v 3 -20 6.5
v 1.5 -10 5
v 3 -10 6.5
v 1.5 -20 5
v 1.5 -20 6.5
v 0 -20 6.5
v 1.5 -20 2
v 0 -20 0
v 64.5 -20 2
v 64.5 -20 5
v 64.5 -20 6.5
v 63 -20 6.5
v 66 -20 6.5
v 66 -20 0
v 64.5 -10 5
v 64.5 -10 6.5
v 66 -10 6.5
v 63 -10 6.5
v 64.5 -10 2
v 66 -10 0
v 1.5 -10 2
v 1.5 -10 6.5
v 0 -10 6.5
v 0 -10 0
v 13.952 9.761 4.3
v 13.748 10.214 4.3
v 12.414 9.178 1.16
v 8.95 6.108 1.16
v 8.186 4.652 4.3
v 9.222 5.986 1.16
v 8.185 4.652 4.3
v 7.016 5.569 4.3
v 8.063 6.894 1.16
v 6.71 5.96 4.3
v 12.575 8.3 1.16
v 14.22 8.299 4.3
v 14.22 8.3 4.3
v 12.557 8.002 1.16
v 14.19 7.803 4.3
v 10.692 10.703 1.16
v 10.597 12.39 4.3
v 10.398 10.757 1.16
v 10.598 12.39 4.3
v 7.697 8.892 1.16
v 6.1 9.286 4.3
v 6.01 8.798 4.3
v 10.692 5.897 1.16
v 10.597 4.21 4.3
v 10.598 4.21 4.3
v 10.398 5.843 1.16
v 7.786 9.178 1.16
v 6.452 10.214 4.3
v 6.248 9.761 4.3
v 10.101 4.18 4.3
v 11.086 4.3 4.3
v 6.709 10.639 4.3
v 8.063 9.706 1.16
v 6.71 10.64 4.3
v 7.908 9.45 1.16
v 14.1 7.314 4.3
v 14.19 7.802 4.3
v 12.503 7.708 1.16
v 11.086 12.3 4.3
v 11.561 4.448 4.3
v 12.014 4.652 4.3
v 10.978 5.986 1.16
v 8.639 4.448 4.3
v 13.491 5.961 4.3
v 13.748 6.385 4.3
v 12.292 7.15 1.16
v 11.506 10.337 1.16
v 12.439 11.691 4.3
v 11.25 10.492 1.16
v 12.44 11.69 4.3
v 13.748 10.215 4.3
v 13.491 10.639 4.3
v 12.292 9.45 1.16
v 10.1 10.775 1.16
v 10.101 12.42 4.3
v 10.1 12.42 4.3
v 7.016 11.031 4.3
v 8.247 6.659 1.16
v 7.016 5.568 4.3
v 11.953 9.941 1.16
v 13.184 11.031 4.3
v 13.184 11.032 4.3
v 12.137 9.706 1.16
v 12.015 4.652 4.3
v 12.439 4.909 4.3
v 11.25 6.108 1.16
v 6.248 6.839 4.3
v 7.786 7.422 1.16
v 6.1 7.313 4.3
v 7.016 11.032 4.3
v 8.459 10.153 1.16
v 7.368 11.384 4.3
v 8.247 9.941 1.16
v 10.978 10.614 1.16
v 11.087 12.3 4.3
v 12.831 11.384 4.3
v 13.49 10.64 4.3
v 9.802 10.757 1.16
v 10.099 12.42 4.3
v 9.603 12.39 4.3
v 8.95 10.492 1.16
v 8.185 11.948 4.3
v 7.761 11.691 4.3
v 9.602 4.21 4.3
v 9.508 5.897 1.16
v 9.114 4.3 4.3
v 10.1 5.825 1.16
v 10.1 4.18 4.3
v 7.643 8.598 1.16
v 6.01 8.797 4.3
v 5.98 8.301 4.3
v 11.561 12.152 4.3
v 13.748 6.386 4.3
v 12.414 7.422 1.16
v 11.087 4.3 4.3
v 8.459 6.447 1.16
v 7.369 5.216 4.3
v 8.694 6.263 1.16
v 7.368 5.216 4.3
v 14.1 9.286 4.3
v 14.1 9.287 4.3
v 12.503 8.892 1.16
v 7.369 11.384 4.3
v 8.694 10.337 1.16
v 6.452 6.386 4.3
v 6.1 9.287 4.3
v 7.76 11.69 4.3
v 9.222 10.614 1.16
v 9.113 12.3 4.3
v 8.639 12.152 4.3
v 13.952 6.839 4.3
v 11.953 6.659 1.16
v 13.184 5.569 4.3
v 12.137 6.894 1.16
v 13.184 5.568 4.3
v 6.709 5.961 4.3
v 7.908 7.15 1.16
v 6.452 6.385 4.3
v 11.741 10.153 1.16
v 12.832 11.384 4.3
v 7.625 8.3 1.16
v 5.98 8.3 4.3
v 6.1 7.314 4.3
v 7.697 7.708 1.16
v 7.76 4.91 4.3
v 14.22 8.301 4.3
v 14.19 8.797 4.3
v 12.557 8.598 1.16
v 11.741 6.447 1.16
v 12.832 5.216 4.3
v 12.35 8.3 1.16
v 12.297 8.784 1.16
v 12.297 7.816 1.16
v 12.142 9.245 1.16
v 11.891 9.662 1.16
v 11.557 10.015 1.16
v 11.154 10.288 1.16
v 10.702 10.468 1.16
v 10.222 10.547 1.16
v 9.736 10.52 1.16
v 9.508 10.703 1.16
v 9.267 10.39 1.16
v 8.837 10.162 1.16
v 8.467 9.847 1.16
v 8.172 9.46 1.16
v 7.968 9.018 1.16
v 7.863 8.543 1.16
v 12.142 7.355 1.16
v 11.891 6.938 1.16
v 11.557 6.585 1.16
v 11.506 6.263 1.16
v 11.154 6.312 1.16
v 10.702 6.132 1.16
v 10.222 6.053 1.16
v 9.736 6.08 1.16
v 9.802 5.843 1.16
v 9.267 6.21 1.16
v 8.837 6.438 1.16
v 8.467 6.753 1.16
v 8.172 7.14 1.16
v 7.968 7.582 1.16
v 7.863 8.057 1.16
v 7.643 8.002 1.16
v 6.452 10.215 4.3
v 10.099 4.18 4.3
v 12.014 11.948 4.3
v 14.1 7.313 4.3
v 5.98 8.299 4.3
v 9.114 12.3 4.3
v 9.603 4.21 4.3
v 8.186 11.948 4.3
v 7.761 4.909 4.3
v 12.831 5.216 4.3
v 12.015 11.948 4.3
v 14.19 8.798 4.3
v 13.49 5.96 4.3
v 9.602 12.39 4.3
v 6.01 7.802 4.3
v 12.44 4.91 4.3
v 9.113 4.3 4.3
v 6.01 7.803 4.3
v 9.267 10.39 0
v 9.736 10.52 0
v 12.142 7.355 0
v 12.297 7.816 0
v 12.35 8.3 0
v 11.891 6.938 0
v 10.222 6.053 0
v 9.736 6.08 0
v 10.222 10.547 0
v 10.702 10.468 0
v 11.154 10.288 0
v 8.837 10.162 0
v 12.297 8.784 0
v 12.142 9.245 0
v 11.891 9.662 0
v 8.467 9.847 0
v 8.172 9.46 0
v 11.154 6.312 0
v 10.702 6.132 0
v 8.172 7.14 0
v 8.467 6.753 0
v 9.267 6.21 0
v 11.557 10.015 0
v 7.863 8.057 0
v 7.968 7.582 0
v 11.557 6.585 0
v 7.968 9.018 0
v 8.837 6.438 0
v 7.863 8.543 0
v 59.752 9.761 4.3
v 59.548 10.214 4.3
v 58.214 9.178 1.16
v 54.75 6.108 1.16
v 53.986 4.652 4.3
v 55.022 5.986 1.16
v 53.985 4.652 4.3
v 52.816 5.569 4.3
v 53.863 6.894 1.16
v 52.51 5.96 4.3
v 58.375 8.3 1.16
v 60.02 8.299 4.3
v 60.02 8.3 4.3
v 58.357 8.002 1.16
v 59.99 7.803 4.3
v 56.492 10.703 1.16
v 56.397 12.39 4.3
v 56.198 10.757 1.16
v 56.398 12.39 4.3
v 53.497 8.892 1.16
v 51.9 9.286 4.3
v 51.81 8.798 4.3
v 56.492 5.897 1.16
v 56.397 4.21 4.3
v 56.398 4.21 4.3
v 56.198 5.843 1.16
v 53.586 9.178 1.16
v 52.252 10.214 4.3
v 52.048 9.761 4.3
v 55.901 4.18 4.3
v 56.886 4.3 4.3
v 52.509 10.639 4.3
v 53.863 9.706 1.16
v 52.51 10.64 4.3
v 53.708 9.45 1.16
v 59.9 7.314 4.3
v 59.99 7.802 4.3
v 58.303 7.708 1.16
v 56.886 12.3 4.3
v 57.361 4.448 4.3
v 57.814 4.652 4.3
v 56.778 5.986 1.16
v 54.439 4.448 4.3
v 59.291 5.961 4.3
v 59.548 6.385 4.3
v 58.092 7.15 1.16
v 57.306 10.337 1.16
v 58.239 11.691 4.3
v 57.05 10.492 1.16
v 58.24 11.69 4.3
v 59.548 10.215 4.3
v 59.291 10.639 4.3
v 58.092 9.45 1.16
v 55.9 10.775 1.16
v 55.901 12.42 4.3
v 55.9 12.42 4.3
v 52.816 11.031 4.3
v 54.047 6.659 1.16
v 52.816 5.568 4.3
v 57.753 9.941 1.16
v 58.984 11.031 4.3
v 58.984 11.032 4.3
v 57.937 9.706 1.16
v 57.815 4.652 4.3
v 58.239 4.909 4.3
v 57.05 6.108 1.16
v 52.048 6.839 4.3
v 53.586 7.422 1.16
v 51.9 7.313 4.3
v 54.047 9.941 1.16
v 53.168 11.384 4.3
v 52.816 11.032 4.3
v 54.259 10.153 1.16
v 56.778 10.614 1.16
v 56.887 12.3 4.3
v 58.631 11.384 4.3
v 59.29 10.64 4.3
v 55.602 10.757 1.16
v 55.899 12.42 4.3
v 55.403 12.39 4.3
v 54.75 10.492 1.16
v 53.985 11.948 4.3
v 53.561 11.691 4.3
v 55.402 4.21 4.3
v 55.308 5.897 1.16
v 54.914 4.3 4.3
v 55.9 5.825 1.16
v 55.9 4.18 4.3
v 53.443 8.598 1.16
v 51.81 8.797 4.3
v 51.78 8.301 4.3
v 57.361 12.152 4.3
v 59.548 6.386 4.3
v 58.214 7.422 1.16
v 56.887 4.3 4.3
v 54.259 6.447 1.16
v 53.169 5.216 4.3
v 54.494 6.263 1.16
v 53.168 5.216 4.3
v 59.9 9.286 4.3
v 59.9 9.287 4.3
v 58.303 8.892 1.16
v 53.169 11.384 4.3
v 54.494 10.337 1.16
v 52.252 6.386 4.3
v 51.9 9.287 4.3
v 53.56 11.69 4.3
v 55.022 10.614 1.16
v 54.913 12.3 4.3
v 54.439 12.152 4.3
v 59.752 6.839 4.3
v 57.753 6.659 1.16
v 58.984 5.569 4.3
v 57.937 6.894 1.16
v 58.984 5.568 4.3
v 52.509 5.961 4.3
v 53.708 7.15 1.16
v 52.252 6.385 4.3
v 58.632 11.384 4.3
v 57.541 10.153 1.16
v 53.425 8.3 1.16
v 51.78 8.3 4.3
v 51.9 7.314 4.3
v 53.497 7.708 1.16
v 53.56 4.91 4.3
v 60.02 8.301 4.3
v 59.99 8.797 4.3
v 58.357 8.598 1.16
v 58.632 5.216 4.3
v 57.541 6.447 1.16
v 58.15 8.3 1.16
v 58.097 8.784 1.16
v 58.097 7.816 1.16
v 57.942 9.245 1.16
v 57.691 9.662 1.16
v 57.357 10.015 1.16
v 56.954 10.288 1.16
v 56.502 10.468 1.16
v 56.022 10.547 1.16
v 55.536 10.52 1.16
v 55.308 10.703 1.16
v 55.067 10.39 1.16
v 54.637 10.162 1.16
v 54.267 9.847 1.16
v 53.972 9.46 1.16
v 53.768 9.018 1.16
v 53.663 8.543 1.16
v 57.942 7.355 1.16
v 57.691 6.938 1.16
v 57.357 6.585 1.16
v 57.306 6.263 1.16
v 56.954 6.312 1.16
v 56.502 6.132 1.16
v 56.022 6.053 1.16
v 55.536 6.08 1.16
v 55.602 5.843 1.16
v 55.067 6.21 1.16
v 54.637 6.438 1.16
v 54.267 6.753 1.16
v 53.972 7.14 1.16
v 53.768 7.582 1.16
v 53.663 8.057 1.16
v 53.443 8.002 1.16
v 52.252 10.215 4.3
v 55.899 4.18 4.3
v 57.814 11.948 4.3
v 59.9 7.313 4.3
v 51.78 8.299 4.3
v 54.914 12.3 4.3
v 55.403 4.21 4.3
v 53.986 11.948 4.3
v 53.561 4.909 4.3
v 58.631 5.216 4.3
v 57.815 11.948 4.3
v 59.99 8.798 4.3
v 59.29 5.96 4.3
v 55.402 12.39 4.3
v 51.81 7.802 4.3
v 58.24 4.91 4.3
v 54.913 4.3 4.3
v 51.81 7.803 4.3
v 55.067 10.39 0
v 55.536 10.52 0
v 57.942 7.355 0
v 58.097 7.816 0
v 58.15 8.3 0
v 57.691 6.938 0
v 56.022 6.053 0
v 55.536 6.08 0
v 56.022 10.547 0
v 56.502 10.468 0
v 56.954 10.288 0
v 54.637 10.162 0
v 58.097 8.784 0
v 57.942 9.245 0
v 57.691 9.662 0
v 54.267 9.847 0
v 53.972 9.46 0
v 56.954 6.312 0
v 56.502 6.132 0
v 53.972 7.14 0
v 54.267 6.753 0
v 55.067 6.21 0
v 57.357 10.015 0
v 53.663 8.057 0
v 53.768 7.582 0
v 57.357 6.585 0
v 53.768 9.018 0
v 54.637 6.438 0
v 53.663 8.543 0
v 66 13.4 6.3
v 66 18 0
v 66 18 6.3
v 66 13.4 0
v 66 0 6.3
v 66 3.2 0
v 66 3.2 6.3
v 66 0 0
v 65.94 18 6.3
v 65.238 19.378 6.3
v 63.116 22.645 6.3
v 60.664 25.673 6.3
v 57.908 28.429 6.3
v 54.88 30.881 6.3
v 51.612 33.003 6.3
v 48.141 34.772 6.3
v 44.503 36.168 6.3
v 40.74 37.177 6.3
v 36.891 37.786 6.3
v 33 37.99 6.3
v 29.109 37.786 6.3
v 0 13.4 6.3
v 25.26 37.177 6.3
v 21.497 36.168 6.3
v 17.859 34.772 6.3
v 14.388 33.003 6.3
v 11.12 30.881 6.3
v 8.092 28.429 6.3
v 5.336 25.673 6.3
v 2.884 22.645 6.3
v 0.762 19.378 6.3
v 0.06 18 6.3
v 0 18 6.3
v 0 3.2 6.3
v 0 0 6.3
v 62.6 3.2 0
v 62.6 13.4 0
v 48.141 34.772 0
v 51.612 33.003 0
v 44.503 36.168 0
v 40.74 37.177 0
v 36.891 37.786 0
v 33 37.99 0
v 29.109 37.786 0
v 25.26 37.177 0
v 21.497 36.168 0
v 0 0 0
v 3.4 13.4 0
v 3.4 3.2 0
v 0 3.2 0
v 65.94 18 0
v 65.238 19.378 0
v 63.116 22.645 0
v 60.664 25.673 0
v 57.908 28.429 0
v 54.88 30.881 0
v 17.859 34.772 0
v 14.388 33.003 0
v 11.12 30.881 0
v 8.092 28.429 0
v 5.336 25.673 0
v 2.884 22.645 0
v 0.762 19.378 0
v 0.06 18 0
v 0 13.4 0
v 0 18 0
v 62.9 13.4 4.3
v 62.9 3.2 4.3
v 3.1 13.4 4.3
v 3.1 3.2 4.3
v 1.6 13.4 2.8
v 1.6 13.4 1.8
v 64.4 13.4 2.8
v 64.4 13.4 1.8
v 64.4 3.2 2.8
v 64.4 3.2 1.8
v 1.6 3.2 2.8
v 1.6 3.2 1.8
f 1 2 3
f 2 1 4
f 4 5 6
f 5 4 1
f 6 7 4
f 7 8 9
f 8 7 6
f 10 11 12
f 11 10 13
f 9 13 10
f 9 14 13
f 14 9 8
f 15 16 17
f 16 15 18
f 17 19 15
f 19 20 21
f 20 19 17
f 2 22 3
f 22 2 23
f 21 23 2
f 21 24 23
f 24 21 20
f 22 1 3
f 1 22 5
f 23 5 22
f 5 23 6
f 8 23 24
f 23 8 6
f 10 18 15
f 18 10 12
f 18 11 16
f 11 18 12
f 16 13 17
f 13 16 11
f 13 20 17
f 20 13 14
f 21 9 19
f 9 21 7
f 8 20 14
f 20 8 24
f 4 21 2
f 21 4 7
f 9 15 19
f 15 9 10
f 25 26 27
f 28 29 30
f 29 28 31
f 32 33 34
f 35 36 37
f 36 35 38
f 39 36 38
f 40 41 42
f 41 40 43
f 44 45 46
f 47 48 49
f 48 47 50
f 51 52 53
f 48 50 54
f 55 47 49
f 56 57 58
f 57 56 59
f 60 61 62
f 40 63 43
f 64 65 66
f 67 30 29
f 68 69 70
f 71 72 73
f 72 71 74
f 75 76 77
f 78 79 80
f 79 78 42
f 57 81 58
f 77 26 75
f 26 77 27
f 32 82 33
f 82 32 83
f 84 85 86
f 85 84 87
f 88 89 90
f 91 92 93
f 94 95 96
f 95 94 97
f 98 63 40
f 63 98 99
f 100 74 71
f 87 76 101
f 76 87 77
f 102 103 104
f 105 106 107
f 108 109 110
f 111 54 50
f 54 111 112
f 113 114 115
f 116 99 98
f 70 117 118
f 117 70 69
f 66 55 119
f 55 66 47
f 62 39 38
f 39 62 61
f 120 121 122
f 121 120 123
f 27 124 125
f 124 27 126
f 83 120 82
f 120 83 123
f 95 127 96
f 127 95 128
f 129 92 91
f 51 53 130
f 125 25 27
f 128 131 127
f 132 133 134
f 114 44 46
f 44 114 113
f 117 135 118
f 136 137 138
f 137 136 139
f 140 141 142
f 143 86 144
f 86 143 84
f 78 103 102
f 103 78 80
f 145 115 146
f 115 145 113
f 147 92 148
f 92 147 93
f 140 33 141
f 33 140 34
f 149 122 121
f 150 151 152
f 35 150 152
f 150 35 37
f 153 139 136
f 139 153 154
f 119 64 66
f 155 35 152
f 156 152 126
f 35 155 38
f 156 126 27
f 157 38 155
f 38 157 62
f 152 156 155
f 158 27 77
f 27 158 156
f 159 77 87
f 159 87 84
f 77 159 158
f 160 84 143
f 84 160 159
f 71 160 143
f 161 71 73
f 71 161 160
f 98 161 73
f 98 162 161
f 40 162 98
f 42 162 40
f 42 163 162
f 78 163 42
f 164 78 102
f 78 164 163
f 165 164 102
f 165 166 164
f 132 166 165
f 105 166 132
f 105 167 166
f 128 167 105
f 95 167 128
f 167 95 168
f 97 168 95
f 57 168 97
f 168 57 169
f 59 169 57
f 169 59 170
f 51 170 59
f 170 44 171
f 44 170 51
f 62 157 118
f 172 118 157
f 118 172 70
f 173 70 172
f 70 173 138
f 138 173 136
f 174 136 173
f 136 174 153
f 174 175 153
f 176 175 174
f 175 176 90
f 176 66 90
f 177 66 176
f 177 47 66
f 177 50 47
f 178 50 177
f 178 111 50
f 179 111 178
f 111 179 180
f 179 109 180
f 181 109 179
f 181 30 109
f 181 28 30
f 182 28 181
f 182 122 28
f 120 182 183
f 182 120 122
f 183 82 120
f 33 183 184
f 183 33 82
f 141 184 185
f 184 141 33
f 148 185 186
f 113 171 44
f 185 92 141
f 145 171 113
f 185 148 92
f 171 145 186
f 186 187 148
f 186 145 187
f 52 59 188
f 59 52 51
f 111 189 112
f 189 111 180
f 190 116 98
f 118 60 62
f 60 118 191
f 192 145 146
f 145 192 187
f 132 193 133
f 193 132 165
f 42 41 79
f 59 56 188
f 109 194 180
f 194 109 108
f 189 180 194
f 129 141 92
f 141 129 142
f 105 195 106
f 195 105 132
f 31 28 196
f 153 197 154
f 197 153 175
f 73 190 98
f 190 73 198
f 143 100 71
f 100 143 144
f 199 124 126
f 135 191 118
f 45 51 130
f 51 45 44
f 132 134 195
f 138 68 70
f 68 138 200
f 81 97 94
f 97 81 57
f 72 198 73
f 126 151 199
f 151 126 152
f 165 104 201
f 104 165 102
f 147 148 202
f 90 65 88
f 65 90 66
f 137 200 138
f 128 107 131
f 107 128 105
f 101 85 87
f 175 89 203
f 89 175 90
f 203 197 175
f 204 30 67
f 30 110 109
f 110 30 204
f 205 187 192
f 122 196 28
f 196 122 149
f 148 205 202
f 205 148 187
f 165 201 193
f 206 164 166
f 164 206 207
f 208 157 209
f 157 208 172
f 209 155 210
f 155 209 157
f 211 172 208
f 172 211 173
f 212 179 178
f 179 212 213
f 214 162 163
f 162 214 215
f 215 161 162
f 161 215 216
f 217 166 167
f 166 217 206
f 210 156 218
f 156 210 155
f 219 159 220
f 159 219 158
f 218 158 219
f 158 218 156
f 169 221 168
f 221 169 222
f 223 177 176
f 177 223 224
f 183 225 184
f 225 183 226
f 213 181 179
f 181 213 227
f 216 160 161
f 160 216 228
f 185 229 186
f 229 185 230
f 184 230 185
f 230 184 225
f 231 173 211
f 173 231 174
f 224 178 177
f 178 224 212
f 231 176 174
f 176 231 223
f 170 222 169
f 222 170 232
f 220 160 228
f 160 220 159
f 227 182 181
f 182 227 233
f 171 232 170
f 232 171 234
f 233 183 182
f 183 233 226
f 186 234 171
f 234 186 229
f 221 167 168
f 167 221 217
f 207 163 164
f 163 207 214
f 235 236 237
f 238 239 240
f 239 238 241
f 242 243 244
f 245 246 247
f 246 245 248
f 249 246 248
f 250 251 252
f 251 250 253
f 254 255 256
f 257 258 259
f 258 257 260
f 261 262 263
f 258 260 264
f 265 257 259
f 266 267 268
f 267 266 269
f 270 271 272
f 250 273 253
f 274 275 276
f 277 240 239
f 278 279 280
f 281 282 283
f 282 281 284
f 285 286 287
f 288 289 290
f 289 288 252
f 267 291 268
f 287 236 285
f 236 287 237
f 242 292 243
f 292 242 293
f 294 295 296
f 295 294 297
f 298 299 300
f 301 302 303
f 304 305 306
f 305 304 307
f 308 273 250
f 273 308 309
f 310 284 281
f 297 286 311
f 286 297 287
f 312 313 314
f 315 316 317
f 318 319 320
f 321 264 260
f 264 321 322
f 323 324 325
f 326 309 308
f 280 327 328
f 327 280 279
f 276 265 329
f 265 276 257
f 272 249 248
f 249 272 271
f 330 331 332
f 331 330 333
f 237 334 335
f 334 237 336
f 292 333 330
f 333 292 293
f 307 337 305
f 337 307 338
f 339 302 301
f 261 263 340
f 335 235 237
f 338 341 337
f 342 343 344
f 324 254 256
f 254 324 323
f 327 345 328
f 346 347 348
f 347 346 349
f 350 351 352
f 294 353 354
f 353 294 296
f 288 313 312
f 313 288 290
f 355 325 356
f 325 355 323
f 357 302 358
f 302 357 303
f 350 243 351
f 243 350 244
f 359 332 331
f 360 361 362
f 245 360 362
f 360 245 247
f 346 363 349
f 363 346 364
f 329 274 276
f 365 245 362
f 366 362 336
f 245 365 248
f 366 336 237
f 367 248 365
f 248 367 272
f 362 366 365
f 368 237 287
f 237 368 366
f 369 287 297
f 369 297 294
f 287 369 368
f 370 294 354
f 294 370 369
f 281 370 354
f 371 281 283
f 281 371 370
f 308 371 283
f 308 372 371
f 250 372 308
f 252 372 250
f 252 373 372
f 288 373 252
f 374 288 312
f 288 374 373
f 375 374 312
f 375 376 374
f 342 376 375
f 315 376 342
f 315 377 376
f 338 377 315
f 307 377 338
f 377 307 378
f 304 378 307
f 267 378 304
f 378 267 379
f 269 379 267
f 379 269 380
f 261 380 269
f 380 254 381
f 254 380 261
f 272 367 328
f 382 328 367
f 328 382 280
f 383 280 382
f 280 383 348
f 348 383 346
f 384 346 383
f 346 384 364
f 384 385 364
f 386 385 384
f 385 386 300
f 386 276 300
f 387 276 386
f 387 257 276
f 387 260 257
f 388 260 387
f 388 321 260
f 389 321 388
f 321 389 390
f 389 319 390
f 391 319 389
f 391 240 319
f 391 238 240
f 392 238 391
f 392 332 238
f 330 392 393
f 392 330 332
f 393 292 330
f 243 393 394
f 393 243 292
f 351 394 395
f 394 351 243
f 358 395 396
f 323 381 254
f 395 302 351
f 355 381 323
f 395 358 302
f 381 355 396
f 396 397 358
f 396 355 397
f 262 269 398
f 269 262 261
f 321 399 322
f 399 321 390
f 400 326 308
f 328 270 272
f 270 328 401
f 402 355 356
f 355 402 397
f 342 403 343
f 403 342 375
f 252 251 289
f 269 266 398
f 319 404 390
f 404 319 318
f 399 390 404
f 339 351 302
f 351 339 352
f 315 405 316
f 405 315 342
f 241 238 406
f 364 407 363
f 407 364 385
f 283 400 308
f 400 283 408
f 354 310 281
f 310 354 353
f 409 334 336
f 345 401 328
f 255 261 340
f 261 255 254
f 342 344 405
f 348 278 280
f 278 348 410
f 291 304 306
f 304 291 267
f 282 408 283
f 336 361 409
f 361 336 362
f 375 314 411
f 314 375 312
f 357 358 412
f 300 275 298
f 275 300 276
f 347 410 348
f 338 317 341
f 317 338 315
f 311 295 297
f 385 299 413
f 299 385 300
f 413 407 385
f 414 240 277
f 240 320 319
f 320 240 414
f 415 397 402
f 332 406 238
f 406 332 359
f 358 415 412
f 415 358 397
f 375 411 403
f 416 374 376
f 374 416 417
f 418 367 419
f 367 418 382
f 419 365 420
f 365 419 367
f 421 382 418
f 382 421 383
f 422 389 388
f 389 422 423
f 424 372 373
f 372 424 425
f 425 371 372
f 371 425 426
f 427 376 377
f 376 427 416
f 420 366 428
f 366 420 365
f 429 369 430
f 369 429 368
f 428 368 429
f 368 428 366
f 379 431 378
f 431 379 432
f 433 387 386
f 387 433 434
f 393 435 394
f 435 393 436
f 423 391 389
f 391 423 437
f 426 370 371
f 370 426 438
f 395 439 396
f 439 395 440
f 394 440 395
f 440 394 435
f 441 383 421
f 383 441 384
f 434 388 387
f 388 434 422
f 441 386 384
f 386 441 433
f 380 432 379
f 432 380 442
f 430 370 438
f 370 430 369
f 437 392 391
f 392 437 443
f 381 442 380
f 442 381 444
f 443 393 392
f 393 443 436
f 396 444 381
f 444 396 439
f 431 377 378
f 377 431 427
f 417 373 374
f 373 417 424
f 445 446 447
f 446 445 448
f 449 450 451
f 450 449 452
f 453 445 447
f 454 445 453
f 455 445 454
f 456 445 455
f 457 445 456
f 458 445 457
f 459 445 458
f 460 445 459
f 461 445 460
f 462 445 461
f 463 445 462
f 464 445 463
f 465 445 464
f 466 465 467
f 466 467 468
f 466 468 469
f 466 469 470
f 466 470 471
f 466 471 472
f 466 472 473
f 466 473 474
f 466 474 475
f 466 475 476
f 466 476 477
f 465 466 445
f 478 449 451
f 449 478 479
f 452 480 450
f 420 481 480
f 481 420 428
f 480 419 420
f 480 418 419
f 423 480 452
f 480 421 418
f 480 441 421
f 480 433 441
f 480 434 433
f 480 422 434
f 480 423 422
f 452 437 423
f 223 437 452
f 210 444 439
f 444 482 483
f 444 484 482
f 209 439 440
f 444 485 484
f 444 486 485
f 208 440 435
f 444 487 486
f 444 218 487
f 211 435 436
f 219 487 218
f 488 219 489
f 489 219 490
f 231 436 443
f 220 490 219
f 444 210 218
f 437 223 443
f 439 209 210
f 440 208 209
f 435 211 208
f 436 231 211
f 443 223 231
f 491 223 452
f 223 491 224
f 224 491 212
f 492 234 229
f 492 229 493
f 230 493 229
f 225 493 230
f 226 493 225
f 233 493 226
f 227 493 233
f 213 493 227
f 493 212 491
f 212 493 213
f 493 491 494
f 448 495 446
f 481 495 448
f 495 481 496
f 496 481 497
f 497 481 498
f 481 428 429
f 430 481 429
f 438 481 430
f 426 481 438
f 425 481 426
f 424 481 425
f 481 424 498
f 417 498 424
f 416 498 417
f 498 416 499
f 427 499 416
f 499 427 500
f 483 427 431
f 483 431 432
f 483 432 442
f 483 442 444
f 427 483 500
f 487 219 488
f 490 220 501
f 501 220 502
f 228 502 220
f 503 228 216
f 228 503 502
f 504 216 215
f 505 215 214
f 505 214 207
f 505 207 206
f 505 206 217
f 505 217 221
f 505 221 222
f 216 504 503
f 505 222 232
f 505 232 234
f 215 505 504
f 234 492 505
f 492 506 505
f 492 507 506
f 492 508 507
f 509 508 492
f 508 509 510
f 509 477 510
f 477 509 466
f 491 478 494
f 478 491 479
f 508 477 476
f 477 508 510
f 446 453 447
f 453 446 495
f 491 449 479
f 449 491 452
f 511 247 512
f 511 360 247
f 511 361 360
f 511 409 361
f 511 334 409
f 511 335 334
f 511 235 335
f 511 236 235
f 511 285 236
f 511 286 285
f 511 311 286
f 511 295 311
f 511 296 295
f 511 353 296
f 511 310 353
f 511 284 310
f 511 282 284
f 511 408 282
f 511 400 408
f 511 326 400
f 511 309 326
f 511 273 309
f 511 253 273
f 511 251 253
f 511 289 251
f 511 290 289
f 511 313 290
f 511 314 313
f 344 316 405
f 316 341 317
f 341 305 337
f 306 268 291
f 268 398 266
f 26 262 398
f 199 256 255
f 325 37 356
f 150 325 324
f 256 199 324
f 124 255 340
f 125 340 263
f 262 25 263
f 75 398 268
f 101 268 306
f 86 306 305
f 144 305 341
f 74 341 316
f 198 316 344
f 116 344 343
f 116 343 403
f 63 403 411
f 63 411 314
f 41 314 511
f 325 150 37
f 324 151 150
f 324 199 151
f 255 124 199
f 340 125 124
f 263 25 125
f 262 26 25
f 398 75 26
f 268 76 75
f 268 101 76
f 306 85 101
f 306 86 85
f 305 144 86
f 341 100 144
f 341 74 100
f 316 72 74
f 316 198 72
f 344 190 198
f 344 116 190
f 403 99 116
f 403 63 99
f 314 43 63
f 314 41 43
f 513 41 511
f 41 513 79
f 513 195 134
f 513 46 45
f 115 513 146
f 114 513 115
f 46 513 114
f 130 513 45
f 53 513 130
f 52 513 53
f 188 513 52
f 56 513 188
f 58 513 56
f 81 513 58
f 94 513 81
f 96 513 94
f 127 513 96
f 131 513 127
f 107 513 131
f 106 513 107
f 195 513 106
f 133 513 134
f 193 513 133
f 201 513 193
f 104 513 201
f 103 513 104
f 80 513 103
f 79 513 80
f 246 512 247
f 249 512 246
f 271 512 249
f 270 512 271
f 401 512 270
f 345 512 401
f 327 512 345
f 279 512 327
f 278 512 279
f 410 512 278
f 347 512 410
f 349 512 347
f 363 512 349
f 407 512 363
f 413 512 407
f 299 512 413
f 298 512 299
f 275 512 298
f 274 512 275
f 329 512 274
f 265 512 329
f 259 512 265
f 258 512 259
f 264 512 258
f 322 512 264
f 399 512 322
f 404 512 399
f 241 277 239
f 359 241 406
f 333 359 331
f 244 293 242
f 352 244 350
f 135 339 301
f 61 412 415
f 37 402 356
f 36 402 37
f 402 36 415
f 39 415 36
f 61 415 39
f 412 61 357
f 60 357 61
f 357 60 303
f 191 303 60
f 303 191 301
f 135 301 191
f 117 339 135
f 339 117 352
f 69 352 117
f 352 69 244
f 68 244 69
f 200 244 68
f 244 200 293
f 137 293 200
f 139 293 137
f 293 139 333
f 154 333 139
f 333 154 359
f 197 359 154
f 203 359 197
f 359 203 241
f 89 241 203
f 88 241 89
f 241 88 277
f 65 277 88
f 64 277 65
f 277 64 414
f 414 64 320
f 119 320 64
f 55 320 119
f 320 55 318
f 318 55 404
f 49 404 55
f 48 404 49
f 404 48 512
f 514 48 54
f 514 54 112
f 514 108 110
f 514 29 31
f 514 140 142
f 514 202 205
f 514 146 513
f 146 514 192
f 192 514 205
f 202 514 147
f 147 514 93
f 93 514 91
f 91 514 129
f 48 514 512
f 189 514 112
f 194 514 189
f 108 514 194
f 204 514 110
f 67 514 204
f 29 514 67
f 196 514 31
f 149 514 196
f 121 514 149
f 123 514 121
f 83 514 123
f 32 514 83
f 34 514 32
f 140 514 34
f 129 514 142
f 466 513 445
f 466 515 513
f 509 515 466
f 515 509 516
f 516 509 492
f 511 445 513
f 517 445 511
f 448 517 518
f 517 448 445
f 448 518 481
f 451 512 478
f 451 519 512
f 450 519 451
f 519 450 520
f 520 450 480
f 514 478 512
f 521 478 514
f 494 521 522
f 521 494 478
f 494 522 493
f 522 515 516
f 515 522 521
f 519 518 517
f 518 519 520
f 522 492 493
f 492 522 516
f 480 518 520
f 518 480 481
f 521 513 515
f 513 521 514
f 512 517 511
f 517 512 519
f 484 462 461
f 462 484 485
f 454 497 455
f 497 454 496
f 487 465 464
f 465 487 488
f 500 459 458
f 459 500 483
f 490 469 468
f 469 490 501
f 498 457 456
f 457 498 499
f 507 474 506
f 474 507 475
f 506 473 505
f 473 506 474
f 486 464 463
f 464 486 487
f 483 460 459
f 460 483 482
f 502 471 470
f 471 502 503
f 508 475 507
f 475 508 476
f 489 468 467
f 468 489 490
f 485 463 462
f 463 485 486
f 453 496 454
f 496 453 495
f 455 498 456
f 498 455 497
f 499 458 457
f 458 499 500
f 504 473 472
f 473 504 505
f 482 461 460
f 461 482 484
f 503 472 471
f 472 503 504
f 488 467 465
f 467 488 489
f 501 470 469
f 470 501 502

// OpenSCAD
// file: nuts.scad
e = 0.1; // epsilon

// Screws / Nuts
// described by a K-Element vector, offsets defined as follows
nut_diameter_low   = 0;
nut_diameter_high  = 1;
nut_height         = 2;
screw_channel      = 3;
screw_head_channel = 4;
screw_head_height  = 5;
m3 = [ 5.6,  6.5, 2.5, 3.5,  6.0, 2.5];
m4 = [ 7.0,  8.0, 3.5, 4.5,  7.5, 3.0];
m5 = [ 8.0,  9.2, 3.7, 5.0,  9.2, 3.5];
m6 = [10.0, 11.2, 5.0, 6.0, 10.1, 4.0];

module nut_hole (nut, h)
{
    w = (nut [nut_diameter_low] + nut [nut_diameter_high]) / 2;
    translate ([0, 0, h / 2]) difference () {
        cube ([w, 2*w, h], center = true);
        rotate ([0, 0, 30])
            translate ([0, 1.5 * w, 0])
                cube ([2*w, 2*w, h+e], center = true);
        rotate ([0, 0, -30])
            translate ([0, 1.5 * w, 0])
                cube ([2*w, 2*w, h+e], center = true);
        rotate ([0, 0, 30])
            translate ([0, -1.5 * w, 0])
                cube ([2*w, 2*w, h+e], center = true);
        rotate ([0, 0, -30])
            translate ([0, -1.5 * w, 0])
                cube ([2*w, 2*w, h+e], center = true);
    }
}

module countersunk_screw_hole (nut, h)
{
    cylinder
        ( r1 = (nut [screw_head_channel] * 1.1) / 2
        , r2 = (nut [screw_channel]      * 1.1) / 2
        , h  = nut [screw_head_height]  * 1.05
        );
    cylinder (r = nut [screw_channel] / 2, h = h + nut [screw_head_height]);
}

//countersunk_screw_hole (m5, 10, $fa = 6, $fs = .5);
// main file
include <nuts.scad>;

module ear (l, h, d)
{
    v = l / 2;
    kr = (v*v + h*h) / (2 * h);
    difference () {
        translate ([0, -(kr - h), 0])
            cylinder (r = kr, h = d);
        translate ([-l, -2 * l, -d])
            cube ([2 * l, 2 * l, 3 * d]);
    }
}

module handle
    ( h = 66, h2 = 62.8
    , w = 18, w2 = 10.2
    , d1 = 6.3, d2 = 4.3, dd3 = 2.5, d4 = 1
    , hd = 8.5, nut = m5
    , k = 3.2
    , e = 20
    )
{
    hh = (h - h2) / 2;
    d3 = d2 - dd3;
    a  = 2 * d3 / sqrt (2);
    b  = 2 * (dd3 - d4) / sqrt (2);
    difference () {
        cube ([h, w, d1]);
        translate ([-h, k, d2])
            cube ([3*h, w2, d1]);
        translate ([-hh, k, -d1])
            cube ([2 * hh, w2, 3*d1]);
        translate ([-hh + h, k, -d1])
            cube ([2 * hh, w2, 3*d1]);
        translate ([hh + hd, k + w2 / 2, d2 + 0.01])
            rotate ([180, 0, 0])
                countersunk_screw_hole (m4, 3 * d1);
        translate ([h - hh - hd, k + w2 / 2, d2 + 0.01])
            rotate ([180, 0, 0])
                countersunk_screw_hole (m4, 3 * d1);
        translate ([-d3 + hh, k, 0])
            rotate ([0, 45, 0])
                cube ([a, w2, a]);
        translate ([h + d3 - hh, k, 0])
            mirror ([1, 0, 0]) rotate ([0, 45, 0])
                cube ([a, w2, a]);
        translate ([-(dd3 - d4) + hh, k, d2])
            rotate ([0, 45, 0])
                cube ([b, w2, b]);
        translate ([h + (dd3 - d4) - hh, k, d2])
            mirror ([1, 0, 0]) rotate ([0, 45, 0])
                cube ([b, w2, b]);
    }
    translate ([h / 2, w - 0.01, 0])
        ear (h, e, d1);
}

module clip (w = 10, p)
{
    a = sqrt (2) * p / 2;
    difference () {
        rotate ([0, -45, 0])
            cube ([p, w, p]);
        translate ([-p, -w, a])
            cube ([3 * p, 3 * w, 3 * p]);
        translate ([-3 * p, -w, -p])
            cube ([3 * p, 3 * w, 3 * p]);
    }
}

module cover (h = 66, w = 10, d = 2, d2 = 1.5, h1 = 3, h2 = 1.5)
{
    p = 4 * d2 / sqrt (2);
    cube ([h, w, d]);
    cube ([d2, w, d + h1 + h2]);
    translate ([h - d2, 0, 0])
        cube ([d2, w, d + h1 + h2]);
    translate ([0, 0, -2 * d2 + h1 + h2 + d])
        clip (w, p);
    translate ([h, 0, -2 * d2 + h1 + h2 + d])
        mirror ([1, 0, 0]) clip (w, p);
}

translate ([0, -20, 0])
    cover ($fa = 6, $fs = .5);
handle ($fa = 6, $fs = .5);
